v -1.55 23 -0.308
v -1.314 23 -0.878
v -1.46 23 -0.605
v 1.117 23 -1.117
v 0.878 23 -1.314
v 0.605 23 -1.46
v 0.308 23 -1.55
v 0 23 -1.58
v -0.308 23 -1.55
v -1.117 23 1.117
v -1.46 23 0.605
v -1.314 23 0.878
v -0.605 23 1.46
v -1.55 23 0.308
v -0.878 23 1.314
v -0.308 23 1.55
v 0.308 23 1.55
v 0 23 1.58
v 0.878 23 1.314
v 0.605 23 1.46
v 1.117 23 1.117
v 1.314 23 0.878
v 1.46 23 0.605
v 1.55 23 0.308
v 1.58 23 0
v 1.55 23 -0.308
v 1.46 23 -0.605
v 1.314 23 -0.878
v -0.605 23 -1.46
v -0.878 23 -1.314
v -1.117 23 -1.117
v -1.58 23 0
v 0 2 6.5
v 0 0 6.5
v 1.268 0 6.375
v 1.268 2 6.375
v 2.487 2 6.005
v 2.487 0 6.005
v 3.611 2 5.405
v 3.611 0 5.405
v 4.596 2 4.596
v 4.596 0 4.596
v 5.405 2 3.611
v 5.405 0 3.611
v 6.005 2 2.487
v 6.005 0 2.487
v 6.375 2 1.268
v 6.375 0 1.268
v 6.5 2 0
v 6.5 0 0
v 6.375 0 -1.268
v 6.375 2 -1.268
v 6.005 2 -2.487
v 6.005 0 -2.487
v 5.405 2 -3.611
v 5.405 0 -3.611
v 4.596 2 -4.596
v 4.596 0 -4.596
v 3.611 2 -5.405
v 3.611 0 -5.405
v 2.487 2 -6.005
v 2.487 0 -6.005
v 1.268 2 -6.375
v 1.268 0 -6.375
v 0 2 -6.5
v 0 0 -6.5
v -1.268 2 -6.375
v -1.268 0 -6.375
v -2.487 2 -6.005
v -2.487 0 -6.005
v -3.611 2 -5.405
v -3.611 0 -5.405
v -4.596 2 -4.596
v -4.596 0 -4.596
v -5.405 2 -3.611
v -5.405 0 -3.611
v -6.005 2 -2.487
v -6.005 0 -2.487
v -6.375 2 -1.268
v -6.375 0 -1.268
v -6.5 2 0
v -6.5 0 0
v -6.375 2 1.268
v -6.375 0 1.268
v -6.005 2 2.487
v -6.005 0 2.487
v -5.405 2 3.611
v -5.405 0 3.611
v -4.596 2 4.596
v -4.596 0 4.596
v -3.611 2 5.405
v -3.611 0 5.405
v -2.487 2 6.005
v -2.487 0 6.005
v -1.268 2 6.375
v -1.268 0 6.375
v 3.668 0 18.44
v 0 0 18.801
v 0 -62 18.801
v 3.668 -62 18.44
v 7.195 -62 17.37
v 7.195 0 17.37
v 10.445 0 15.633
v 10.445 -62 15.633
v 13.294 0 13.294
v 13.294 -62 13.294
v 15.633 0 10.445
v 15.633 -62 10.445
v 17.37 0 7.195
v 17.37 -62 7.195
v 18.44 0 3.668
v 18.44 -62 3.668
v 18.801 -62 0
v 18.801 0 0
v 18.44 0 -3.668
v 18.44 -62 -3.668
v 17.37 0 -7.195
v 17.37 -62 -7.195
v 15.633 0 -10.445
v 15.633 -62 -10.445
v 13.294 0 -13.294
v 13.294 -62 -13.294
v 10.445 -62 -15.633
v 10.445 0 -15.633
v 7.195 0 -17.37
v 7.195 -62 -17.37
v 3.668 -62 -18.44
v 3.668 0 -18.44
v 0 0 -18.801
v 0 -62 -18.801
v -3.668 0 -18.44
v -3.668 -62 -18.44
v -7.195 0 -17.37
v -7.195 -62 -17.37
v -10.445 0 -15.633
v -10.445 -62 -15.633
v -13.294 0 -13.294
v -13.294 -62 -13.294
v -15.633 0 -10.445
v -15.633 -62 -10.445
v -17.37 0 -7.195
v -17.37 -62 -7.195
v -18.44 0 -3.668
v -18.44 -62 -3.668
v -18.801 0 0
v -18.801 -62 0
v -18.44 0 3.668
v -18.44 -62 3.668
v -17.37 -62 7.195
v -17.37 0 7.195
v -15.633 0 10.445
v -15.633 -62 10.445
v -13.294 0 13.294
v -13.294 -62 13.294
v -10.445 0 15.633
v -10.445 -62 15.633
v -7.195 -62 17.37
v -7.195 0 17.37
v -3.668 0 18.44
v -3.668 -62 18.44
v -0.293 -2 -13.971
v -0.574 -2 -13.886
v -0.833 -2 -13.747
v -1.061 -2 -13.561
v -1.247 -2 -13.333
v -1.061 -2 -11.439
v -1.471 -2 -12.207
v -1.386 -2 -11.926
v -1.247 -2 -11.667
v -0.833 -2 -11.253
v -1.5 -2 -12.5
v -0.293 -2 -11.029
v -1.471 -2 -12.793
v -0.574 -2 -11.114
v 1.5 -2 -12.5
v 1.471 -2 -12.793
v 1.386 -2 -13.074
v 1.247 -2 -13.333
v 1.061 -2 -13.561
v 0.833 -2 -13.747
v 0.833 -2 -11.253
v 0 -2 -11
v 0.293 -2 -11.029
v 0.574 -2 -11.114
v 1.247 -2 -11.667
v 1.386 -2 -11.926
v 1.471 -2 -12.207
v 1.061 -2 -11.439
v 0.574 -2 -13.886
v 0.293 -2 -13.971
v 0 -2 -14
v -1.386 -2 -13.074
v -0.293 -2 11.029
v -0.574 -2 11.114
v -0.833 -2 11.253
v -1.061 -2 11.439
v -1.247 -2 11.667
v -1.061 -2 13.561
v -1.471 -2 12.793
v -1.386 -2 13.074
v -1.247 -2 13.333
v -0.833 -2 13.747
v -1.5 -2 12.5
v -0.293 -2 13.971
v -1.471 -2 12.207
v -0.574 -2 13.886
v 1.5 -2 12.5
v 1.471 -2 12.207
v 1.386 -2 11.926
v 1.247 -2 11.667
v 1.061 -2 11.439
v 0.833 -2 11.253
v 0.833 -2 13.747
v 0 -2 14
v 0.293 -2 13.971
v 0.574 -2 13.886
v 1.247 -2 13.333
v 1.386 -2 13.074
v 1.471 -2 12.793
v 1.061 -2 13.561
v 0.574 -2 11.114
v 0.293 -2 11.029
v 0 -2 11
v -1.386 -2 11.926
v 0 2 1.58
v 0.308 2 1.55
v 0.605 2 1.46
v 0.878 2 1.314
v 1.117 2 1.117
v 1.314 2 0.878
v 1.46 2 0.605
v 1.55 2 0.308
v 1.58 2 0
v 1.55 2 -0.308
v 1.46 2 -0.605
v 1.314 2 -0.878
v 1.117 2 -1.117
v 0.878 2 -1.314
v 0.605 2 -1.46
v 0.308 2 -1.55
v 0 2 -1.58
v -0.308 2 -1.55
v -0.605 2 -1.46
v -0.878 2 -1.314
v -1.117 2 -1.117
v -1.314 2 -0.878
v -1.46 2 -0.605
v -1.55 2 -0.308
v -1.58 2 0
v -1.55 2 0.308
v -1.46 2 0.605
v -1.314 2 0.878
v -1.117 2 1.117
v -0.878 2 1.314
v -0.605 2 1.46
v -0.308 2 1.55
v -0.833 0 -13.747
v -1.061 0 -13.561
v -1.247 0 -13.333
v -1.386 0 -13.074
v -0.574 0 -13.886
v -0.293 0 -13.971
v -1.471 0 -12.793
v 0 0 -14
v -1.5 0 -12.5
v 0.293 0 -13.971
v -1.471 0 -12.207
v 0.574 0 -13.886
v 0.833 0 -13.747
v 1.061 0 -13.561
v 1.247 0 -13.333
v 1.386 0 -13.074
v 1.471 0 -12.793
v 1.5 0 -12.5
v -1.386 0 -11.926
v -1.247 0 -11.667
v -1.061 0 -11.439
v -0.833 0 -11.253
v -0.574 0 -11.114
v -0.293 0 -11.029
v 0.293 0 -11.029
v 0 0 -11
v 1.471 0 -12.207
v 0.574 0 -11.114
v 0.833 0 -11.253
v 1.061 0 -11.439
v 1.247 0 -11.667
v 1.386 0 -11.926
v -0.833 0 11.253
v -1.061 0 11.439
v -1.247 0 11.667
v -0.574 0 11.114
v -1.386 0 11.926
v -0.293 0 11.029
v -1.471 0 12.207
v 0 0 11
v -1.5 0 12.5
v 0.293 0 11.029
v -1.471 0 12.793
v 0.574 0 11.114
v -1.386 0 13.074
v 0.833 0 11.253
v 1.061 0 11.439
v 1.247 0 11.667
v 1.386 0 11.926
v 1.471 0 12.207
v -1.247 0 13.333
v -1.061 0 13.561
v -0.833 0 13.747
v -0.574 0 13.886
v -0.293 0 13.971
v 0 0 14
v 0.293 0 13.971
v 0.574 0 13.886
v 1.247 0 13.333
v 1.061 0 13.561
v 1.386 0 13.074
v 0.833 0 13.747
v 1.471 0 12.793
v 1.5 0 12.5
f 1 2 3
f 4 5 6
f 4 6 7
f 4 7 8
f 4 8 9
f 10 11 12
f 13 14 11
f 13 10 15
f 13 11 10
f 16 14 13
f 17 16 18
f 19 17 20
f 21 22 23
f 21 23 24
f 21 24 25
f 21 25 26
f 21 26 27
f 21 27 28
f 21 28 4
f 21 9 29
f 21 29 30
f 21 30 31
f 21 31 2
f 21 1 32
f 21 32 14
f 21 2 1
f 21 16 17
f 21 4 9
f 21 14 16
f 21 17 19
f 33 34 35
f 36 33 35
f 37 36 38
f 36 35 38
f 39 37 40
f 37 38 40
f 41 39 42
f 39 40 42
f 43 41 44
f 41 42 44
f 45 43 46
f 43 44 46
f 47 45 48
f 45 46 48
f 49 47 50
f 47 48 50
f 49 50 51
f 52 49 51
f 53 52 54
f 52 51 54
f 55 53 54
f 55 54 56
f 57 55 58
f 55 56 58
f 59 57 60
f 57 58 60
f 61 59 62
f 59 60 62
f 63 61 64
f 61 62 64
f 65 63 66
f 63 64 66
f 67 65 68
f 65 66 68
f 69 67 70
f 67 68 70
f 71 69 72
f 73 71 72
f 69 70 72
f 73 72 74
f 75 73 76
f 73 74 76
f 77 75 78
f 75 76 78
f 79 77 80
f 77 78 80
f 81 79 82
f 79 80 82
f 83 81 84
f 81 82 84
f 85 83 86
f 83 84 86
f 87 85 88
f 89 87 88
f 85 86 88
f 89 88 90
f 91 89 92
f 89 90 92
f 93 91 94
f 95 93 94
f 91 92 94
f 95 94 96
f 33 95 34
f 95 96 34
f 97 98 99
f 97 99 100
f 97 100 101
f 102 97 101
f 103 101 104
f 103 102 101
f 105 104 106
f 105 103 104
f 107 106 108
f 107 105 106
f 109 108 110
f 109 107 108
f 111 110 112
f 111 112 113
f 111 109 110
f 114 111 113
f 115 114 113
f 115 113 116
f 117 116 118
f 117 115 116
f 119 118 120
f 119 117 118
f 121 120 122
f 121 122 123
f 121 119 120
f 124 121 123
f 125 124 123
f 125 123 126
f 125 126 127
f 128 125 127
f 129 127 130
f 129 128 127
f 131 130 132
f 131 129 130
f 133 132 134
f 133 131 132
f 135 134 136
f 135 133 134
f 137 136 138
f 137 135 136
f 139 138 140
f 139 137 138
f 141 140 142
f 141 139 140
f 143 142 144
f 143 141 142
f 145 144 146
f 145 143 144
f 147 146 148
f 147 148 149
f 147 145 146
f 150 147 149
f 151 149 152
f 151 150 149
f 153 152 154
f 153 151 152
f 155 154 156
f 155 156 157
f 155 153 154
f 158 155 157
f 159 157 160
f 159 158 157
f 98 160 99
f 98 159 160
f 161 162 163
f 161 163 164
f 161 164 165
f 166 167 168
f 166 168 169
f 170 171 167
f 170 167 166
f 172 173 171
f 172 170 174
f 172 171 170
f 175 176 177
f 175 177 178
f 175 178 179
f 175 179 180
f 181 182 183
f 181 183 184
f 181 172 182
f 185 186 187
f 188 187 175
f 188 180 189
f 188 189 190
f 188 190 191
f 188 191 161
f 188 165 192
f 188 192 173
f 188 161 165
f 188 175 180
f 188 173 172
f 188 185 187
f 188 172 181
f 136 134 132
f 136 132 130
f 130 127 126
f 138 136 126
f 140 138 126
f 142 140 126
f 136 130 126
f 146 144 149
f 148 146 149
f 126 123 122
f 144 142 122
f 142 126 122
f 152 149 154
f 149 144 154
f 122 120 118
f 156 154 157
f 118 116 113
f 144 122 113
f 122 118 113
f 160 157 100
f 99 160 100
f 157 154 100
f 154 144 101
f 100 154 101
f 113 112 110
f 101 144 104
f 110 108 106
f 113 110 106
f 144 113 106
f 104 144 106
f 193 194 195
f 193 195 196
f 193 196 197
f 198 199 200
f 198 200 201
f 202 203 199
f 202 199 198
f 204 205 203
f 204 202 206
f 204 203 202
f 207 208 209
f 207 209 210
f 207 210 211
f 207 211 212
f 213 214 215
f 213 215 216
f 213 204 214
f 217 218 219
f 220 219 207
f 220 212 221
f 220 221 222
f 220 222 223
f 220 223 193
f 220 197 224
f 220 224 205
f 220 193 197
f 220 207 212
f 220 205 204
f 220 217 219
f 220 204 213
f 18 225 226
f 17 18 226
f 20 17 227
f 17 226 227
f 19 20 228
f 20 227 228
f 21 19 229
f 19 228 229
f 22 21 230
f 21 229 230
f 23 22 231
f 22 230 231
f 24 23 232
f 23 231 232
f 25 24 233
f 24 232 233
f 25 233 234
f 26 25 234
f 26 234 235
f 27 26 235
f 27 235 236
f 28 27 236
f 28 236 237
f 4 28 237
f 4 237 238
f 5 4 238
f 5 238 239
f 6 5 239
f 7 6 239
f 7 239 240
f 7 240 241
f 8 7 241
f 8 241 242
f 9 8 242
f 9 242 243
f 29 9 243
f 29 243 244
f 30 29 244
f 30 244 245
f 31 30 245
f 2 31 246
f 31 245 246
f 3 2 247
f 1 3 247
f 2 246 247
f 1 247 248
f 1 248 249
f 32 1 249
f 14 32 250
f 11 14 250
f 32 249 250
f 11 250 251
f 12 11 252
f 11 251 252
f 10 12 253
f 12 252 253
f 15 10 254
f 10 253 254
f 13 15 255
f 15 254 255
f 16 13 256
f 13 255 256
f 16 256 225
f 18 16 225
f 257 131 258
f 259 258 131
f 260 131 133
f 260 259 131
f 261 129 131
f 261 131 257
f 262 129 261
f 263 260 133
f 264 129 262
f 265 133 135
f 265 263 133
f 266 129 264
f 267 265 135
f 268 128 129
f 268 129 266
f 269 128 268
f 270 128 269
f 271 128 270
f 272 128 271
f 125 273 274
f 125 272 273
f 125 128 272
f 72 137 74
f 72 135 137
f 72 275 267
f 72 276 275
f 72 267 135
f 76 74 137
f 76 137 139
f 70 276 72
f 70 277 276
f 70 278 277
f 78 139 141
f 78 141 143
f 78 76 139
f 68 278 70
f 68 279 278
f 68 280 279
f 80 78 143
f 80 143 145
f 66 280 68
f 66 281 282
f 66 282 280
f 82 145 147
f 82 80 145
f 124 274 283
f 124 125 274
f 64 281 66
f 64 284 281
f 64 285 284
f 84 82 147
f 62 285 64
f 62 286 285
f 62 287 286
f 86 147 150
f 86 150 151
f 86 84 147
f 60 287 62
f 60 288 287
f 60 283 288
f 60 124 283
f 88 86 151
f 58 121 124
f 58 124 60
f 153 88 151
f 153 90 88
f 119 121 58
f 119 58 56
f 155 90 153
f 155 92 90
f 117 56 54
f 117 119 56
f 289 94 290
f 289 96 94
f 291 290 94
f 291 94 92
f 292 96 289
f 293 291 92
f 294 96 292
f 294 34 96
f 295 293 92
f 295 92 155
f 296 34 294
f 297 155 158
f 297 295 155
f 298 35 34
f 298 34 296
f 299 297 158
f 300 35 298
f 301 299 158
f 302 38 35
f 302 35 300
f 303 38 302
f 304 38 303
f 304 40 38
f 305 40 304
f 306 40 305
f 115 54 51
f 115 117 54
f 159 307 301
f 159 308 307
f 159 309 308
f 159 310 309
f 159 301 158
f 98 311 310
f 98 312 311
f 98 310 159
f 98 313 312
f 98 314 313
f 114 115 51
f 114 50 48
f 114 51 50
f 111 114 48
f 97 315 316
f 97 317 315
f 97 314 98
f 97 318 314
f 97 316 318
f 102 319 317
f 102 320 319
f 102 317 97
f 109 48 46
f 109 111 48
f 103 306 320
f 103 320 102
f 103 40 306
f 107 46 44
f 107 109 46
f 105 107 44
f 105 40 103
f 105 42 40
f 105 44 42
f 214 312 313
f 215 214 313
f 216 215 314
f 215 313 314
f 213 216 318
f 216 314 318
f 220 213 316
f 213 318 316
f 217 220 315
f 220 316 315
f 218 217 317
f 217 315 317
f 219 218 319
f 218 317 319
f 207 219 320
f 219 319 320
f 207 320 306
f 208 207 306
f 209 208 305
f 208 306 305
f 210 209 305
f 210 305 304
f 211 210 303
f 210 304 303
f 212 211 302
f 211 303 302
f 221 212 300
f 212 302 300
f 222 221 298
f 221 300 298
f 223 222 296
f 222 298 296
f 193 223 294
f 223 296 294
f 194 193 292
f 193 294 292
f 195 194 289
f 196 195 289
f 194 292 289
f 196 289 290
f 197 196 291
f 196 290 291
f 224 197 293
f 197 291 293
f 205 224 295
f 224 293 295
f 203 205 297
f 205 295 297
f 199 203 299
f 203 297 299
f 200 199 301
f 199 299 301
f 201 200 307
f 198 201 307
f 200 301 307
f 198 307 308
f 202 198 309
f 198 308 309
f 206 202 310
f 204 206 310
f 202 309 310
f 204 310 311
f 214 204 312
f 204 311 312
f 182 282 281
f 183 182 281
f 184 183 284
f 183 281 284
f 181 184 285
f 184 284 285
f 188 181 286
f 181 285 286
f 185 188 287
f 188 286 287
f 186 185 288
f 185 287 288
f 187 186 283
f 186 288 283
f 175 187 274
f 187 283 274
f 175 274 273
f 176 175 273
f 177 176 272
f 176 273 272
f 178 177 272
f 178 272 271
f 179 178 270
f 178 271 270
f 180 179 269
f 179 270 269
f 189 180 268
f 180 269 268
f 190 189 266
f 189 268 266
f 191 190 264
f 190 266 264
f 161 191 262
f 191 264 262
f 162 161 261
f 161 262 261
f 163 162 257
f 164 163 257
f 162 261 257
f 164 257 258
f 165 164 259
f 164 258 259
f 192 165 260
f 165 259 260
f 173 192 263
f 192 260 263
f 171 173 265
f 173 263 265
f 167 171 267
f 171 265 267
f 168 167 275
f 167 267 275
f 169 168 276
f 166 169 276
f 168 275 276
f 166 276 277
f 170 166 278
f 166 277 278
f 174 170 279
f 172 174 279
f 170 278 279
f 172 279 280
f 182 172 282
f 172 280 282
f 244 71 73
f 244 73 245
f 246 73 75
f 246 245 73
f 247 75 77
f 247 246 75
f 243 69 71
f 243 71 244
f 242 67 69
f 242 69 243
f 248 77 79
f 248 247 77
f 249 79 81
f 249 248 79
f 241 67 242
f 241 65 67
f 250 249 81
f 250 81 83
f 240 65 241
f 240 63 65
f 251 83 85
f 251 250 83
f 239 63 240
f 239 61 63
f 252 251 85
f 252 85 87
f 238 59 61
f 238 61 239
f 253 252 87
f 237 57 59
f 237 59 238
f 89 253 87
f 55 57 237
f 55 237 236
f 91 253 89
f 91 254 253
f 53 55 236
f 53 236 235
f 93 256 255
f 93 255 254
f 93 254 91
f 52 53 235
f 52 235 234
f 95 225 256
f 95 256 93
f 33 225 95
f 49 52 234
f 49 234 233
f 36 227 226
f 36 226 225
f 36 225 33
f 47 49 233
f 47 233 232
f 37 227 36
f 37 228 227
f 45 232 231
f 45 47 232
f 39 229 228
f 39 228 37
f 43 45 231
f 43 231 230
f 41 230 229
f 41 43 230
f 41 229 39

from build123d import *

# Parameters (mm, degrees)
SKETCH1_R           = 18.80108
BOSS_EXTRUDE1_DEPTH = 62
SKETCH2_R           = 1.58
BOSS_EXTRUDE2_DEPTH = 23
SKETCH3_R           = 1.5
CUT_EXTRUDE1_DEPTH  = 2
SKETCH4_R           = 6.5
BOSS_EXTRUDE3_DEPTH = 2


with BuildPart() as part:
    # Sketch1 → Boss-Extrude1 (new body)
    with BuildSketch(Plane(origin=(0, 0, 0), x_dir=(1, 0, 0), z_dir=(0, 1, 0))):
        with Locations(Location((0, 0, 0), (0, 0, 270))):
            Circle(SKETCH1_R)
    extrude(amount=-BOSS_EXTRUDE1_DEPTH)

    # Sketch2 → Boss-Extrude2 (add)
    with BuildSketch(Plane(origin=(0, 0, 0), x_dir=(1, 0, 0), z_dir=(0, 1, 0))):
        with Locations(Location((0, 0, 0), (0, 0, 270))):
            Circle(SKETCH2_R)
    extrude(amount=BOSS_EXTRUDE2_DEPTH)

    # Sketch3 → Cut-Extrude1 (cut)
    with BuildSketch(Plane(origin=(0, 0, 0), x_dir=(1, 0, 0), z_dir=(0, 1, 0))):
        with Locations(Location((0, 12.5, 0), (0, 0, 270))):
            Circle(SKETCH3_R)
        with Locations(Location((0, -12.5, 0), (0, 0, 270))):
            Circle(SKETCH3_R)
    extrude(amount=-CUT_EXTRUDE1_DEPTH, mode=Mode.SUBTRACT)

    # Sketch4 → Boss-Extrude3 (add)
    with BuildSketch(Plane(origin=(0, 0, 0), x_dir=(1, 0, 0), z_dir=(0, 1, 0))):
        with Locations(Location((0, 0, 0), (0, 0, 270))):
            Circle(SKETCH4_R)
    extrude(amount=BOSS_EXTRUDE3_DEPTH)


solid = part.part
